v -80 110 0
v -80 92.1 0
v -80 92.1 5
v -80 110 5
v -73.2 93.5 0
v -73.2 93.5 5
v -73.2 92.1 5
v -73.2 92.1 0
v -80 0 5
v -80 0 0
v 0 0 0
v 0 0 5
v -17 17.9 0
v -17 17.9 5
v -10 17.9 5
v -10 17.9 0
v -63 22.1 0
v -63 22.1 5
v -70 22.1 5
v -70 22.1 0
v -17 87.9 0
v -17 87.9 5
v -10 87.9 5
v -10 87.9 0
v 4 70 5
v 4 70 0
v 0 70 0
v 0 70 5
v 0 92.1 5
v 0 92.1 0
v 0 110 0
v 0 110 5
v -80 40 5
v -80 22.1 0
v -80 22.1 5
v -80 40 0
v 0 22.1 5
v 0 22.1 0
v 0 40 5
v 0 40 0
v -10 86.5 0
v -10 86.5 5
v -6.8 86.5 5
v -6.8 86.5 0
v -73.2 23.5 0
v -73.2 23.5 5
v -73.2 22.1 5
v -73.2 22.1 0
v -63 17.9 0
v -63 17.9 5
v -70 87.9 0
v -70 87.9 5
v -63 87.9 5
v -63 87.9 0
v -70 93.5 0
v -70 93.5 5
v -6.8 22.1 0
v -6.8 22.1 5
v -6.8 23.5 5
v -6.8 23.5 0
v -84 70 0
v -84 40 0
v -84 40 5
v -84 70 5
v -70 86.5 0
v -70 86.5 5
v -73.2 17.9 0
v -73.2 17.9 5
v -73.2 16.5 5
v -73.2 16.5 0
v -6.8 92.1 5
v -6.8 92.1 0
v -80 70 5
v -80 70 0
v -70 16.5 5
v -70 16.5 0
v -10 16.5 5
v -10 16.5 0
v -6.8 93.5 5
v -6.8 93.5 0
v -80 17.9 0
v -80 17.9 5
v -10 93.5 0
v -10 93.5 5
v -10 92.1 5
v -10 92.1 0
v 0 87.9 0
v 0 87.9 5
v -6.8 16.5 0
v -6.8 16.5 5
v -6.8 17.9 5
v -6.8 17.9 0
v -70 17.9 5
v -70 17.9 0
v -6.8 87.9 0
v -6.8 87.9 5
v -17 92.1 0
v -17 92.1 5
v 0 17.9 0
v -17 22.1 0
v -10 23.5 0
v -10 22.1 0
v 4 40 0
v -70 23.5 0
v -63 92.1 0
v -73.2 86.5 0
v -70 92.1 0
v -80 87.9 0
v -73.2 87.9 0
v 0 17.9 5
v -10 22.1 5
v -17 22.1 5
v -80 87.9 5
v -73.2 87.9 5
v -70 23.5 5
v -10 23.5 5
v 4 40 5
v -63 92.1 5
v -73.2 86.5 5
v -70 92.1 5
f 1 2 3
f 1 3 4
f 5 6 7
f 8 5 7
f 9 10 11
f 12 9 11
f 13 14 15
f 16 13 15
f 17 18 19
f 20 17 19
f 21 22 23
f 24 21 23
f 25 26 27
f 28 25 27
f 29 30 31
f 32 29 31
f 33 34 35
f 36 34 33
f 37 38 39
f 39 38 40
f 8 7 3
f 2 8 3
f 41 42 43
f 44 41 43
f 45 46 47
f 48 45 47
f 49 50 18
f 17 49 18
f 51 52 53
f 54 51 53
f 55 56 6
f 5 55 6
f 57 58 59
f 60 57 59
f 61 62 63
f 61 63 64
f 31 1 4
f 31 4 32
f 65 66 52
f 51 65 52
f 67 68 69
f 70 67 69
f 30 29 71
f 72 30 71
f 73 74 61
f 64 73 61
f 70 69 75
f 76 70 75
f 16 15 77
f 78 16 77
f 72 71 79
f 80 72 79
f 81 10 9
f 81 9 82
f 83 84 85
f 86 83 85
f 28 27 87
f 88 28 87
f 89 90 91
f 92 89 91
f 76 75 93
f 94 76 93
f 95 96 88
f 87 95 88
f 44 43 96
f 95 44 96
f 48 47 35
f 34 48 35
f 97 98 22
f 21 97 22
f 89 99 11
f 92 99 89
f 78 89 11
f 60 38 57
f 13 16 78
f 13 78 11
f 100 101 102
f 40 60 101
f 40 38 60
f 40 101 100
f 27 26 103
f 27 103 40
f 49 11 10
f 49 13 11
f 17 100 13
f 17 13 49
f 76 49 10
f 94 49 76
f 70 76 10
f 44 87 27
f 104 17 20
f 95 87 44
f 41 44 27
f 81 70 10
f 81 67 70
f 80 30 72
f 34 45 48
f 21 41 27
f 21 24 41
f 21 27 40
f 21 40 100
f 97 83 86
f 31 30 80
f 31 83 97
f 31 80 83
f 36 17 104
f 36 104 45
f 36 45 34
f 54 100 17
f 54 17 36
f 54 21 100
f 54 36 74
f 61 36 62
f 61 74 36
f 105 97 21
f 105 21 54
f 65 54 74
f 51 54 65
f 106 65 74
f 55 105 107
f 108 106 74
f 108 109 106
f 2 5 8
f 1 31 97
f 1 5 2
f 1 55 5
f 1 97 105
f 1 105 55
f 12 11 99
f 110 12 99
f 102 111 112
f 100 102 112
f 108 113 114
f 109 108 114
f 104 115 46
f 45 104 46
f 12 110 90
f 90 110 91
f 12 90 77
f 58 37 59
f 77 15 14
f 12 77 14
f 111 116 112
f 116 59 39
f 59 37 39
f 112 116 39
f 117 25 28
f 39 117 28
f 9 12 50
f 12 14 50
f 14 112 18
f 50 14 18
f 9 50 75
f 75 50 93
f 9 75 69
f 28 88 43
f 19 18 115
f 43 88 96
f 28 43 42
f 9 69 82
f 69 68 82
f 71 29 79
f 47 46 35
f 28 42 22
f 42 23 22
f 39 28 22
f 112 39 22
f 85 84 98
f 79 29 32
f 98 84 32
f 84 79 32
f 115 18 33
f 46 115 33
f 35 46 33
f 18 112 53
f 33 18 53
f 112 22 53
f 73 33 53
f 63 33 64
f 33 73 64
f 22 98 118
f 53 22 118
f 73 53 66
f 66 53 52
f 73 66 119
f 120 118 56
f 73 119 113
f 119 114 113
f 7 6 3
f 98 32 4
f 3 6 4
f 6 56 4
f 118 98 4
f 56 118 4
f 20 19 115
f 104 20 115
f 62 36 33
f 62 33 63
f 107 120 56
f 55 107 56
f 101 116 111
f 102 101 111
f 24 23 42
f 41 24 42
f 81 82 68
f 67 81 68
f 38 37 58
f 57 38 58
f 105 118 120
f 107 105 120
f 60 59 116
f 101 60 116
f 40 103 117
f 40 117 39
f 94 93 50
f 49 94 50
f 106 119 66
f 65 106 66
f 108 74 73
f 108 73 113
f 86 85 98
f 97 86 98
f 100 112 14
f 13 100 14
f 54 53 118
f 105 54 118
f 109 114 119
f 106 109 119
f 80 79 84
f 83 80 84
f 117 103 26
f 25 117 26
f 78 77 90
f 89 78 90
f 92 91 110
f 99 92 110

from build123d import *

# Parameters (mm, degrees)
ESQUISSE1_W             = 80
ESQUISSE1_H             = 110
BOSS_EXTRU_1_DEPTH      = 5
ENL_V_MAT_EXTRU_2_DEPTH = 137.106575888
ESQUISSE4_W             = 88
ESQUISSE4_H             = 30
BOSS_EXTRU_2_DEPTH      = 5


with BuildPart() as part:
    # Esquisse1 → Boss.-Extru.1 (new body)
    with BuildSketch(Plane.XY):
        with Locations((-40, 55)):
            Rectangle(ESQUISSE1_W, ESQUISSE1_H)
    extrude(amount=BOSS_EXTRU_1_DEPTH)

    # Esquisse3 → Enlèv. mat.-Extru.2 (cut, through all)
    with BuildSketch(Plane.XY.offset(5)):
        Polygon((-17, 87.9), (-10, 87.9), (-10, 86.5), (-6.8, 86.5), (-6.8, 87.9), (0, 87.9), (0, 92.1), (-6.8, 92.1), (-6.8, 93.5), (-10, 93.5), (-10, 92.1), (-17, 92.1), align=None)
        Polygon((-80, 92.1), (-80, 87.9), (-73.2, 87.9), (-73.2, 86.5), (-70, 86.5), (-70, 87.9), (-63, 87.9), (-63, 92.1), (-70, 92.1), (-70, 93.5), (-73.2, 93.5), (-73.2, 92.1), align=None)
        Polygon((-73.2, 22.1), (-80, 22.1), (-80, 17.9), (-73.2, 17.9), (-73.2, 16.5), (-70, 16.5), (-70, 17.9), (-63, 17.9), (-63, 22.1), (-70, 22.1), (-70, 23.5), (-73.2, 23.5), align=None)
        Polygon((0, 17.9), (0, 22.1), (-6.8, 22.1), (-6.8, 23.5), (-10, 23.5), (-10, 22.1), (-17, 22.1), (-17, 17.9), (-10, 17.9), (-10, 16.5), (-6.8, 16.5), (-6.8, 17.9), align=None)
    extrude(amount=-ENL_V_MAT_EXTRU_2_DEPTH, mode=Mode.SUBTRACT)

    # Esquisse4 → Boss.-Extru.2 (add)
    with BuildSketch(Plane(origin=(0, 0, 0), x_dir=(-1, 0, 0), z_dir=(0, 0, -1))):
        with Locations((40, 55)):
            Rectangle(ESQUISSE4_W, ESQUISSE4_H)
    extrude(amount=-BOSS_EXTRU_2_DEPTH)


solid = part.part
